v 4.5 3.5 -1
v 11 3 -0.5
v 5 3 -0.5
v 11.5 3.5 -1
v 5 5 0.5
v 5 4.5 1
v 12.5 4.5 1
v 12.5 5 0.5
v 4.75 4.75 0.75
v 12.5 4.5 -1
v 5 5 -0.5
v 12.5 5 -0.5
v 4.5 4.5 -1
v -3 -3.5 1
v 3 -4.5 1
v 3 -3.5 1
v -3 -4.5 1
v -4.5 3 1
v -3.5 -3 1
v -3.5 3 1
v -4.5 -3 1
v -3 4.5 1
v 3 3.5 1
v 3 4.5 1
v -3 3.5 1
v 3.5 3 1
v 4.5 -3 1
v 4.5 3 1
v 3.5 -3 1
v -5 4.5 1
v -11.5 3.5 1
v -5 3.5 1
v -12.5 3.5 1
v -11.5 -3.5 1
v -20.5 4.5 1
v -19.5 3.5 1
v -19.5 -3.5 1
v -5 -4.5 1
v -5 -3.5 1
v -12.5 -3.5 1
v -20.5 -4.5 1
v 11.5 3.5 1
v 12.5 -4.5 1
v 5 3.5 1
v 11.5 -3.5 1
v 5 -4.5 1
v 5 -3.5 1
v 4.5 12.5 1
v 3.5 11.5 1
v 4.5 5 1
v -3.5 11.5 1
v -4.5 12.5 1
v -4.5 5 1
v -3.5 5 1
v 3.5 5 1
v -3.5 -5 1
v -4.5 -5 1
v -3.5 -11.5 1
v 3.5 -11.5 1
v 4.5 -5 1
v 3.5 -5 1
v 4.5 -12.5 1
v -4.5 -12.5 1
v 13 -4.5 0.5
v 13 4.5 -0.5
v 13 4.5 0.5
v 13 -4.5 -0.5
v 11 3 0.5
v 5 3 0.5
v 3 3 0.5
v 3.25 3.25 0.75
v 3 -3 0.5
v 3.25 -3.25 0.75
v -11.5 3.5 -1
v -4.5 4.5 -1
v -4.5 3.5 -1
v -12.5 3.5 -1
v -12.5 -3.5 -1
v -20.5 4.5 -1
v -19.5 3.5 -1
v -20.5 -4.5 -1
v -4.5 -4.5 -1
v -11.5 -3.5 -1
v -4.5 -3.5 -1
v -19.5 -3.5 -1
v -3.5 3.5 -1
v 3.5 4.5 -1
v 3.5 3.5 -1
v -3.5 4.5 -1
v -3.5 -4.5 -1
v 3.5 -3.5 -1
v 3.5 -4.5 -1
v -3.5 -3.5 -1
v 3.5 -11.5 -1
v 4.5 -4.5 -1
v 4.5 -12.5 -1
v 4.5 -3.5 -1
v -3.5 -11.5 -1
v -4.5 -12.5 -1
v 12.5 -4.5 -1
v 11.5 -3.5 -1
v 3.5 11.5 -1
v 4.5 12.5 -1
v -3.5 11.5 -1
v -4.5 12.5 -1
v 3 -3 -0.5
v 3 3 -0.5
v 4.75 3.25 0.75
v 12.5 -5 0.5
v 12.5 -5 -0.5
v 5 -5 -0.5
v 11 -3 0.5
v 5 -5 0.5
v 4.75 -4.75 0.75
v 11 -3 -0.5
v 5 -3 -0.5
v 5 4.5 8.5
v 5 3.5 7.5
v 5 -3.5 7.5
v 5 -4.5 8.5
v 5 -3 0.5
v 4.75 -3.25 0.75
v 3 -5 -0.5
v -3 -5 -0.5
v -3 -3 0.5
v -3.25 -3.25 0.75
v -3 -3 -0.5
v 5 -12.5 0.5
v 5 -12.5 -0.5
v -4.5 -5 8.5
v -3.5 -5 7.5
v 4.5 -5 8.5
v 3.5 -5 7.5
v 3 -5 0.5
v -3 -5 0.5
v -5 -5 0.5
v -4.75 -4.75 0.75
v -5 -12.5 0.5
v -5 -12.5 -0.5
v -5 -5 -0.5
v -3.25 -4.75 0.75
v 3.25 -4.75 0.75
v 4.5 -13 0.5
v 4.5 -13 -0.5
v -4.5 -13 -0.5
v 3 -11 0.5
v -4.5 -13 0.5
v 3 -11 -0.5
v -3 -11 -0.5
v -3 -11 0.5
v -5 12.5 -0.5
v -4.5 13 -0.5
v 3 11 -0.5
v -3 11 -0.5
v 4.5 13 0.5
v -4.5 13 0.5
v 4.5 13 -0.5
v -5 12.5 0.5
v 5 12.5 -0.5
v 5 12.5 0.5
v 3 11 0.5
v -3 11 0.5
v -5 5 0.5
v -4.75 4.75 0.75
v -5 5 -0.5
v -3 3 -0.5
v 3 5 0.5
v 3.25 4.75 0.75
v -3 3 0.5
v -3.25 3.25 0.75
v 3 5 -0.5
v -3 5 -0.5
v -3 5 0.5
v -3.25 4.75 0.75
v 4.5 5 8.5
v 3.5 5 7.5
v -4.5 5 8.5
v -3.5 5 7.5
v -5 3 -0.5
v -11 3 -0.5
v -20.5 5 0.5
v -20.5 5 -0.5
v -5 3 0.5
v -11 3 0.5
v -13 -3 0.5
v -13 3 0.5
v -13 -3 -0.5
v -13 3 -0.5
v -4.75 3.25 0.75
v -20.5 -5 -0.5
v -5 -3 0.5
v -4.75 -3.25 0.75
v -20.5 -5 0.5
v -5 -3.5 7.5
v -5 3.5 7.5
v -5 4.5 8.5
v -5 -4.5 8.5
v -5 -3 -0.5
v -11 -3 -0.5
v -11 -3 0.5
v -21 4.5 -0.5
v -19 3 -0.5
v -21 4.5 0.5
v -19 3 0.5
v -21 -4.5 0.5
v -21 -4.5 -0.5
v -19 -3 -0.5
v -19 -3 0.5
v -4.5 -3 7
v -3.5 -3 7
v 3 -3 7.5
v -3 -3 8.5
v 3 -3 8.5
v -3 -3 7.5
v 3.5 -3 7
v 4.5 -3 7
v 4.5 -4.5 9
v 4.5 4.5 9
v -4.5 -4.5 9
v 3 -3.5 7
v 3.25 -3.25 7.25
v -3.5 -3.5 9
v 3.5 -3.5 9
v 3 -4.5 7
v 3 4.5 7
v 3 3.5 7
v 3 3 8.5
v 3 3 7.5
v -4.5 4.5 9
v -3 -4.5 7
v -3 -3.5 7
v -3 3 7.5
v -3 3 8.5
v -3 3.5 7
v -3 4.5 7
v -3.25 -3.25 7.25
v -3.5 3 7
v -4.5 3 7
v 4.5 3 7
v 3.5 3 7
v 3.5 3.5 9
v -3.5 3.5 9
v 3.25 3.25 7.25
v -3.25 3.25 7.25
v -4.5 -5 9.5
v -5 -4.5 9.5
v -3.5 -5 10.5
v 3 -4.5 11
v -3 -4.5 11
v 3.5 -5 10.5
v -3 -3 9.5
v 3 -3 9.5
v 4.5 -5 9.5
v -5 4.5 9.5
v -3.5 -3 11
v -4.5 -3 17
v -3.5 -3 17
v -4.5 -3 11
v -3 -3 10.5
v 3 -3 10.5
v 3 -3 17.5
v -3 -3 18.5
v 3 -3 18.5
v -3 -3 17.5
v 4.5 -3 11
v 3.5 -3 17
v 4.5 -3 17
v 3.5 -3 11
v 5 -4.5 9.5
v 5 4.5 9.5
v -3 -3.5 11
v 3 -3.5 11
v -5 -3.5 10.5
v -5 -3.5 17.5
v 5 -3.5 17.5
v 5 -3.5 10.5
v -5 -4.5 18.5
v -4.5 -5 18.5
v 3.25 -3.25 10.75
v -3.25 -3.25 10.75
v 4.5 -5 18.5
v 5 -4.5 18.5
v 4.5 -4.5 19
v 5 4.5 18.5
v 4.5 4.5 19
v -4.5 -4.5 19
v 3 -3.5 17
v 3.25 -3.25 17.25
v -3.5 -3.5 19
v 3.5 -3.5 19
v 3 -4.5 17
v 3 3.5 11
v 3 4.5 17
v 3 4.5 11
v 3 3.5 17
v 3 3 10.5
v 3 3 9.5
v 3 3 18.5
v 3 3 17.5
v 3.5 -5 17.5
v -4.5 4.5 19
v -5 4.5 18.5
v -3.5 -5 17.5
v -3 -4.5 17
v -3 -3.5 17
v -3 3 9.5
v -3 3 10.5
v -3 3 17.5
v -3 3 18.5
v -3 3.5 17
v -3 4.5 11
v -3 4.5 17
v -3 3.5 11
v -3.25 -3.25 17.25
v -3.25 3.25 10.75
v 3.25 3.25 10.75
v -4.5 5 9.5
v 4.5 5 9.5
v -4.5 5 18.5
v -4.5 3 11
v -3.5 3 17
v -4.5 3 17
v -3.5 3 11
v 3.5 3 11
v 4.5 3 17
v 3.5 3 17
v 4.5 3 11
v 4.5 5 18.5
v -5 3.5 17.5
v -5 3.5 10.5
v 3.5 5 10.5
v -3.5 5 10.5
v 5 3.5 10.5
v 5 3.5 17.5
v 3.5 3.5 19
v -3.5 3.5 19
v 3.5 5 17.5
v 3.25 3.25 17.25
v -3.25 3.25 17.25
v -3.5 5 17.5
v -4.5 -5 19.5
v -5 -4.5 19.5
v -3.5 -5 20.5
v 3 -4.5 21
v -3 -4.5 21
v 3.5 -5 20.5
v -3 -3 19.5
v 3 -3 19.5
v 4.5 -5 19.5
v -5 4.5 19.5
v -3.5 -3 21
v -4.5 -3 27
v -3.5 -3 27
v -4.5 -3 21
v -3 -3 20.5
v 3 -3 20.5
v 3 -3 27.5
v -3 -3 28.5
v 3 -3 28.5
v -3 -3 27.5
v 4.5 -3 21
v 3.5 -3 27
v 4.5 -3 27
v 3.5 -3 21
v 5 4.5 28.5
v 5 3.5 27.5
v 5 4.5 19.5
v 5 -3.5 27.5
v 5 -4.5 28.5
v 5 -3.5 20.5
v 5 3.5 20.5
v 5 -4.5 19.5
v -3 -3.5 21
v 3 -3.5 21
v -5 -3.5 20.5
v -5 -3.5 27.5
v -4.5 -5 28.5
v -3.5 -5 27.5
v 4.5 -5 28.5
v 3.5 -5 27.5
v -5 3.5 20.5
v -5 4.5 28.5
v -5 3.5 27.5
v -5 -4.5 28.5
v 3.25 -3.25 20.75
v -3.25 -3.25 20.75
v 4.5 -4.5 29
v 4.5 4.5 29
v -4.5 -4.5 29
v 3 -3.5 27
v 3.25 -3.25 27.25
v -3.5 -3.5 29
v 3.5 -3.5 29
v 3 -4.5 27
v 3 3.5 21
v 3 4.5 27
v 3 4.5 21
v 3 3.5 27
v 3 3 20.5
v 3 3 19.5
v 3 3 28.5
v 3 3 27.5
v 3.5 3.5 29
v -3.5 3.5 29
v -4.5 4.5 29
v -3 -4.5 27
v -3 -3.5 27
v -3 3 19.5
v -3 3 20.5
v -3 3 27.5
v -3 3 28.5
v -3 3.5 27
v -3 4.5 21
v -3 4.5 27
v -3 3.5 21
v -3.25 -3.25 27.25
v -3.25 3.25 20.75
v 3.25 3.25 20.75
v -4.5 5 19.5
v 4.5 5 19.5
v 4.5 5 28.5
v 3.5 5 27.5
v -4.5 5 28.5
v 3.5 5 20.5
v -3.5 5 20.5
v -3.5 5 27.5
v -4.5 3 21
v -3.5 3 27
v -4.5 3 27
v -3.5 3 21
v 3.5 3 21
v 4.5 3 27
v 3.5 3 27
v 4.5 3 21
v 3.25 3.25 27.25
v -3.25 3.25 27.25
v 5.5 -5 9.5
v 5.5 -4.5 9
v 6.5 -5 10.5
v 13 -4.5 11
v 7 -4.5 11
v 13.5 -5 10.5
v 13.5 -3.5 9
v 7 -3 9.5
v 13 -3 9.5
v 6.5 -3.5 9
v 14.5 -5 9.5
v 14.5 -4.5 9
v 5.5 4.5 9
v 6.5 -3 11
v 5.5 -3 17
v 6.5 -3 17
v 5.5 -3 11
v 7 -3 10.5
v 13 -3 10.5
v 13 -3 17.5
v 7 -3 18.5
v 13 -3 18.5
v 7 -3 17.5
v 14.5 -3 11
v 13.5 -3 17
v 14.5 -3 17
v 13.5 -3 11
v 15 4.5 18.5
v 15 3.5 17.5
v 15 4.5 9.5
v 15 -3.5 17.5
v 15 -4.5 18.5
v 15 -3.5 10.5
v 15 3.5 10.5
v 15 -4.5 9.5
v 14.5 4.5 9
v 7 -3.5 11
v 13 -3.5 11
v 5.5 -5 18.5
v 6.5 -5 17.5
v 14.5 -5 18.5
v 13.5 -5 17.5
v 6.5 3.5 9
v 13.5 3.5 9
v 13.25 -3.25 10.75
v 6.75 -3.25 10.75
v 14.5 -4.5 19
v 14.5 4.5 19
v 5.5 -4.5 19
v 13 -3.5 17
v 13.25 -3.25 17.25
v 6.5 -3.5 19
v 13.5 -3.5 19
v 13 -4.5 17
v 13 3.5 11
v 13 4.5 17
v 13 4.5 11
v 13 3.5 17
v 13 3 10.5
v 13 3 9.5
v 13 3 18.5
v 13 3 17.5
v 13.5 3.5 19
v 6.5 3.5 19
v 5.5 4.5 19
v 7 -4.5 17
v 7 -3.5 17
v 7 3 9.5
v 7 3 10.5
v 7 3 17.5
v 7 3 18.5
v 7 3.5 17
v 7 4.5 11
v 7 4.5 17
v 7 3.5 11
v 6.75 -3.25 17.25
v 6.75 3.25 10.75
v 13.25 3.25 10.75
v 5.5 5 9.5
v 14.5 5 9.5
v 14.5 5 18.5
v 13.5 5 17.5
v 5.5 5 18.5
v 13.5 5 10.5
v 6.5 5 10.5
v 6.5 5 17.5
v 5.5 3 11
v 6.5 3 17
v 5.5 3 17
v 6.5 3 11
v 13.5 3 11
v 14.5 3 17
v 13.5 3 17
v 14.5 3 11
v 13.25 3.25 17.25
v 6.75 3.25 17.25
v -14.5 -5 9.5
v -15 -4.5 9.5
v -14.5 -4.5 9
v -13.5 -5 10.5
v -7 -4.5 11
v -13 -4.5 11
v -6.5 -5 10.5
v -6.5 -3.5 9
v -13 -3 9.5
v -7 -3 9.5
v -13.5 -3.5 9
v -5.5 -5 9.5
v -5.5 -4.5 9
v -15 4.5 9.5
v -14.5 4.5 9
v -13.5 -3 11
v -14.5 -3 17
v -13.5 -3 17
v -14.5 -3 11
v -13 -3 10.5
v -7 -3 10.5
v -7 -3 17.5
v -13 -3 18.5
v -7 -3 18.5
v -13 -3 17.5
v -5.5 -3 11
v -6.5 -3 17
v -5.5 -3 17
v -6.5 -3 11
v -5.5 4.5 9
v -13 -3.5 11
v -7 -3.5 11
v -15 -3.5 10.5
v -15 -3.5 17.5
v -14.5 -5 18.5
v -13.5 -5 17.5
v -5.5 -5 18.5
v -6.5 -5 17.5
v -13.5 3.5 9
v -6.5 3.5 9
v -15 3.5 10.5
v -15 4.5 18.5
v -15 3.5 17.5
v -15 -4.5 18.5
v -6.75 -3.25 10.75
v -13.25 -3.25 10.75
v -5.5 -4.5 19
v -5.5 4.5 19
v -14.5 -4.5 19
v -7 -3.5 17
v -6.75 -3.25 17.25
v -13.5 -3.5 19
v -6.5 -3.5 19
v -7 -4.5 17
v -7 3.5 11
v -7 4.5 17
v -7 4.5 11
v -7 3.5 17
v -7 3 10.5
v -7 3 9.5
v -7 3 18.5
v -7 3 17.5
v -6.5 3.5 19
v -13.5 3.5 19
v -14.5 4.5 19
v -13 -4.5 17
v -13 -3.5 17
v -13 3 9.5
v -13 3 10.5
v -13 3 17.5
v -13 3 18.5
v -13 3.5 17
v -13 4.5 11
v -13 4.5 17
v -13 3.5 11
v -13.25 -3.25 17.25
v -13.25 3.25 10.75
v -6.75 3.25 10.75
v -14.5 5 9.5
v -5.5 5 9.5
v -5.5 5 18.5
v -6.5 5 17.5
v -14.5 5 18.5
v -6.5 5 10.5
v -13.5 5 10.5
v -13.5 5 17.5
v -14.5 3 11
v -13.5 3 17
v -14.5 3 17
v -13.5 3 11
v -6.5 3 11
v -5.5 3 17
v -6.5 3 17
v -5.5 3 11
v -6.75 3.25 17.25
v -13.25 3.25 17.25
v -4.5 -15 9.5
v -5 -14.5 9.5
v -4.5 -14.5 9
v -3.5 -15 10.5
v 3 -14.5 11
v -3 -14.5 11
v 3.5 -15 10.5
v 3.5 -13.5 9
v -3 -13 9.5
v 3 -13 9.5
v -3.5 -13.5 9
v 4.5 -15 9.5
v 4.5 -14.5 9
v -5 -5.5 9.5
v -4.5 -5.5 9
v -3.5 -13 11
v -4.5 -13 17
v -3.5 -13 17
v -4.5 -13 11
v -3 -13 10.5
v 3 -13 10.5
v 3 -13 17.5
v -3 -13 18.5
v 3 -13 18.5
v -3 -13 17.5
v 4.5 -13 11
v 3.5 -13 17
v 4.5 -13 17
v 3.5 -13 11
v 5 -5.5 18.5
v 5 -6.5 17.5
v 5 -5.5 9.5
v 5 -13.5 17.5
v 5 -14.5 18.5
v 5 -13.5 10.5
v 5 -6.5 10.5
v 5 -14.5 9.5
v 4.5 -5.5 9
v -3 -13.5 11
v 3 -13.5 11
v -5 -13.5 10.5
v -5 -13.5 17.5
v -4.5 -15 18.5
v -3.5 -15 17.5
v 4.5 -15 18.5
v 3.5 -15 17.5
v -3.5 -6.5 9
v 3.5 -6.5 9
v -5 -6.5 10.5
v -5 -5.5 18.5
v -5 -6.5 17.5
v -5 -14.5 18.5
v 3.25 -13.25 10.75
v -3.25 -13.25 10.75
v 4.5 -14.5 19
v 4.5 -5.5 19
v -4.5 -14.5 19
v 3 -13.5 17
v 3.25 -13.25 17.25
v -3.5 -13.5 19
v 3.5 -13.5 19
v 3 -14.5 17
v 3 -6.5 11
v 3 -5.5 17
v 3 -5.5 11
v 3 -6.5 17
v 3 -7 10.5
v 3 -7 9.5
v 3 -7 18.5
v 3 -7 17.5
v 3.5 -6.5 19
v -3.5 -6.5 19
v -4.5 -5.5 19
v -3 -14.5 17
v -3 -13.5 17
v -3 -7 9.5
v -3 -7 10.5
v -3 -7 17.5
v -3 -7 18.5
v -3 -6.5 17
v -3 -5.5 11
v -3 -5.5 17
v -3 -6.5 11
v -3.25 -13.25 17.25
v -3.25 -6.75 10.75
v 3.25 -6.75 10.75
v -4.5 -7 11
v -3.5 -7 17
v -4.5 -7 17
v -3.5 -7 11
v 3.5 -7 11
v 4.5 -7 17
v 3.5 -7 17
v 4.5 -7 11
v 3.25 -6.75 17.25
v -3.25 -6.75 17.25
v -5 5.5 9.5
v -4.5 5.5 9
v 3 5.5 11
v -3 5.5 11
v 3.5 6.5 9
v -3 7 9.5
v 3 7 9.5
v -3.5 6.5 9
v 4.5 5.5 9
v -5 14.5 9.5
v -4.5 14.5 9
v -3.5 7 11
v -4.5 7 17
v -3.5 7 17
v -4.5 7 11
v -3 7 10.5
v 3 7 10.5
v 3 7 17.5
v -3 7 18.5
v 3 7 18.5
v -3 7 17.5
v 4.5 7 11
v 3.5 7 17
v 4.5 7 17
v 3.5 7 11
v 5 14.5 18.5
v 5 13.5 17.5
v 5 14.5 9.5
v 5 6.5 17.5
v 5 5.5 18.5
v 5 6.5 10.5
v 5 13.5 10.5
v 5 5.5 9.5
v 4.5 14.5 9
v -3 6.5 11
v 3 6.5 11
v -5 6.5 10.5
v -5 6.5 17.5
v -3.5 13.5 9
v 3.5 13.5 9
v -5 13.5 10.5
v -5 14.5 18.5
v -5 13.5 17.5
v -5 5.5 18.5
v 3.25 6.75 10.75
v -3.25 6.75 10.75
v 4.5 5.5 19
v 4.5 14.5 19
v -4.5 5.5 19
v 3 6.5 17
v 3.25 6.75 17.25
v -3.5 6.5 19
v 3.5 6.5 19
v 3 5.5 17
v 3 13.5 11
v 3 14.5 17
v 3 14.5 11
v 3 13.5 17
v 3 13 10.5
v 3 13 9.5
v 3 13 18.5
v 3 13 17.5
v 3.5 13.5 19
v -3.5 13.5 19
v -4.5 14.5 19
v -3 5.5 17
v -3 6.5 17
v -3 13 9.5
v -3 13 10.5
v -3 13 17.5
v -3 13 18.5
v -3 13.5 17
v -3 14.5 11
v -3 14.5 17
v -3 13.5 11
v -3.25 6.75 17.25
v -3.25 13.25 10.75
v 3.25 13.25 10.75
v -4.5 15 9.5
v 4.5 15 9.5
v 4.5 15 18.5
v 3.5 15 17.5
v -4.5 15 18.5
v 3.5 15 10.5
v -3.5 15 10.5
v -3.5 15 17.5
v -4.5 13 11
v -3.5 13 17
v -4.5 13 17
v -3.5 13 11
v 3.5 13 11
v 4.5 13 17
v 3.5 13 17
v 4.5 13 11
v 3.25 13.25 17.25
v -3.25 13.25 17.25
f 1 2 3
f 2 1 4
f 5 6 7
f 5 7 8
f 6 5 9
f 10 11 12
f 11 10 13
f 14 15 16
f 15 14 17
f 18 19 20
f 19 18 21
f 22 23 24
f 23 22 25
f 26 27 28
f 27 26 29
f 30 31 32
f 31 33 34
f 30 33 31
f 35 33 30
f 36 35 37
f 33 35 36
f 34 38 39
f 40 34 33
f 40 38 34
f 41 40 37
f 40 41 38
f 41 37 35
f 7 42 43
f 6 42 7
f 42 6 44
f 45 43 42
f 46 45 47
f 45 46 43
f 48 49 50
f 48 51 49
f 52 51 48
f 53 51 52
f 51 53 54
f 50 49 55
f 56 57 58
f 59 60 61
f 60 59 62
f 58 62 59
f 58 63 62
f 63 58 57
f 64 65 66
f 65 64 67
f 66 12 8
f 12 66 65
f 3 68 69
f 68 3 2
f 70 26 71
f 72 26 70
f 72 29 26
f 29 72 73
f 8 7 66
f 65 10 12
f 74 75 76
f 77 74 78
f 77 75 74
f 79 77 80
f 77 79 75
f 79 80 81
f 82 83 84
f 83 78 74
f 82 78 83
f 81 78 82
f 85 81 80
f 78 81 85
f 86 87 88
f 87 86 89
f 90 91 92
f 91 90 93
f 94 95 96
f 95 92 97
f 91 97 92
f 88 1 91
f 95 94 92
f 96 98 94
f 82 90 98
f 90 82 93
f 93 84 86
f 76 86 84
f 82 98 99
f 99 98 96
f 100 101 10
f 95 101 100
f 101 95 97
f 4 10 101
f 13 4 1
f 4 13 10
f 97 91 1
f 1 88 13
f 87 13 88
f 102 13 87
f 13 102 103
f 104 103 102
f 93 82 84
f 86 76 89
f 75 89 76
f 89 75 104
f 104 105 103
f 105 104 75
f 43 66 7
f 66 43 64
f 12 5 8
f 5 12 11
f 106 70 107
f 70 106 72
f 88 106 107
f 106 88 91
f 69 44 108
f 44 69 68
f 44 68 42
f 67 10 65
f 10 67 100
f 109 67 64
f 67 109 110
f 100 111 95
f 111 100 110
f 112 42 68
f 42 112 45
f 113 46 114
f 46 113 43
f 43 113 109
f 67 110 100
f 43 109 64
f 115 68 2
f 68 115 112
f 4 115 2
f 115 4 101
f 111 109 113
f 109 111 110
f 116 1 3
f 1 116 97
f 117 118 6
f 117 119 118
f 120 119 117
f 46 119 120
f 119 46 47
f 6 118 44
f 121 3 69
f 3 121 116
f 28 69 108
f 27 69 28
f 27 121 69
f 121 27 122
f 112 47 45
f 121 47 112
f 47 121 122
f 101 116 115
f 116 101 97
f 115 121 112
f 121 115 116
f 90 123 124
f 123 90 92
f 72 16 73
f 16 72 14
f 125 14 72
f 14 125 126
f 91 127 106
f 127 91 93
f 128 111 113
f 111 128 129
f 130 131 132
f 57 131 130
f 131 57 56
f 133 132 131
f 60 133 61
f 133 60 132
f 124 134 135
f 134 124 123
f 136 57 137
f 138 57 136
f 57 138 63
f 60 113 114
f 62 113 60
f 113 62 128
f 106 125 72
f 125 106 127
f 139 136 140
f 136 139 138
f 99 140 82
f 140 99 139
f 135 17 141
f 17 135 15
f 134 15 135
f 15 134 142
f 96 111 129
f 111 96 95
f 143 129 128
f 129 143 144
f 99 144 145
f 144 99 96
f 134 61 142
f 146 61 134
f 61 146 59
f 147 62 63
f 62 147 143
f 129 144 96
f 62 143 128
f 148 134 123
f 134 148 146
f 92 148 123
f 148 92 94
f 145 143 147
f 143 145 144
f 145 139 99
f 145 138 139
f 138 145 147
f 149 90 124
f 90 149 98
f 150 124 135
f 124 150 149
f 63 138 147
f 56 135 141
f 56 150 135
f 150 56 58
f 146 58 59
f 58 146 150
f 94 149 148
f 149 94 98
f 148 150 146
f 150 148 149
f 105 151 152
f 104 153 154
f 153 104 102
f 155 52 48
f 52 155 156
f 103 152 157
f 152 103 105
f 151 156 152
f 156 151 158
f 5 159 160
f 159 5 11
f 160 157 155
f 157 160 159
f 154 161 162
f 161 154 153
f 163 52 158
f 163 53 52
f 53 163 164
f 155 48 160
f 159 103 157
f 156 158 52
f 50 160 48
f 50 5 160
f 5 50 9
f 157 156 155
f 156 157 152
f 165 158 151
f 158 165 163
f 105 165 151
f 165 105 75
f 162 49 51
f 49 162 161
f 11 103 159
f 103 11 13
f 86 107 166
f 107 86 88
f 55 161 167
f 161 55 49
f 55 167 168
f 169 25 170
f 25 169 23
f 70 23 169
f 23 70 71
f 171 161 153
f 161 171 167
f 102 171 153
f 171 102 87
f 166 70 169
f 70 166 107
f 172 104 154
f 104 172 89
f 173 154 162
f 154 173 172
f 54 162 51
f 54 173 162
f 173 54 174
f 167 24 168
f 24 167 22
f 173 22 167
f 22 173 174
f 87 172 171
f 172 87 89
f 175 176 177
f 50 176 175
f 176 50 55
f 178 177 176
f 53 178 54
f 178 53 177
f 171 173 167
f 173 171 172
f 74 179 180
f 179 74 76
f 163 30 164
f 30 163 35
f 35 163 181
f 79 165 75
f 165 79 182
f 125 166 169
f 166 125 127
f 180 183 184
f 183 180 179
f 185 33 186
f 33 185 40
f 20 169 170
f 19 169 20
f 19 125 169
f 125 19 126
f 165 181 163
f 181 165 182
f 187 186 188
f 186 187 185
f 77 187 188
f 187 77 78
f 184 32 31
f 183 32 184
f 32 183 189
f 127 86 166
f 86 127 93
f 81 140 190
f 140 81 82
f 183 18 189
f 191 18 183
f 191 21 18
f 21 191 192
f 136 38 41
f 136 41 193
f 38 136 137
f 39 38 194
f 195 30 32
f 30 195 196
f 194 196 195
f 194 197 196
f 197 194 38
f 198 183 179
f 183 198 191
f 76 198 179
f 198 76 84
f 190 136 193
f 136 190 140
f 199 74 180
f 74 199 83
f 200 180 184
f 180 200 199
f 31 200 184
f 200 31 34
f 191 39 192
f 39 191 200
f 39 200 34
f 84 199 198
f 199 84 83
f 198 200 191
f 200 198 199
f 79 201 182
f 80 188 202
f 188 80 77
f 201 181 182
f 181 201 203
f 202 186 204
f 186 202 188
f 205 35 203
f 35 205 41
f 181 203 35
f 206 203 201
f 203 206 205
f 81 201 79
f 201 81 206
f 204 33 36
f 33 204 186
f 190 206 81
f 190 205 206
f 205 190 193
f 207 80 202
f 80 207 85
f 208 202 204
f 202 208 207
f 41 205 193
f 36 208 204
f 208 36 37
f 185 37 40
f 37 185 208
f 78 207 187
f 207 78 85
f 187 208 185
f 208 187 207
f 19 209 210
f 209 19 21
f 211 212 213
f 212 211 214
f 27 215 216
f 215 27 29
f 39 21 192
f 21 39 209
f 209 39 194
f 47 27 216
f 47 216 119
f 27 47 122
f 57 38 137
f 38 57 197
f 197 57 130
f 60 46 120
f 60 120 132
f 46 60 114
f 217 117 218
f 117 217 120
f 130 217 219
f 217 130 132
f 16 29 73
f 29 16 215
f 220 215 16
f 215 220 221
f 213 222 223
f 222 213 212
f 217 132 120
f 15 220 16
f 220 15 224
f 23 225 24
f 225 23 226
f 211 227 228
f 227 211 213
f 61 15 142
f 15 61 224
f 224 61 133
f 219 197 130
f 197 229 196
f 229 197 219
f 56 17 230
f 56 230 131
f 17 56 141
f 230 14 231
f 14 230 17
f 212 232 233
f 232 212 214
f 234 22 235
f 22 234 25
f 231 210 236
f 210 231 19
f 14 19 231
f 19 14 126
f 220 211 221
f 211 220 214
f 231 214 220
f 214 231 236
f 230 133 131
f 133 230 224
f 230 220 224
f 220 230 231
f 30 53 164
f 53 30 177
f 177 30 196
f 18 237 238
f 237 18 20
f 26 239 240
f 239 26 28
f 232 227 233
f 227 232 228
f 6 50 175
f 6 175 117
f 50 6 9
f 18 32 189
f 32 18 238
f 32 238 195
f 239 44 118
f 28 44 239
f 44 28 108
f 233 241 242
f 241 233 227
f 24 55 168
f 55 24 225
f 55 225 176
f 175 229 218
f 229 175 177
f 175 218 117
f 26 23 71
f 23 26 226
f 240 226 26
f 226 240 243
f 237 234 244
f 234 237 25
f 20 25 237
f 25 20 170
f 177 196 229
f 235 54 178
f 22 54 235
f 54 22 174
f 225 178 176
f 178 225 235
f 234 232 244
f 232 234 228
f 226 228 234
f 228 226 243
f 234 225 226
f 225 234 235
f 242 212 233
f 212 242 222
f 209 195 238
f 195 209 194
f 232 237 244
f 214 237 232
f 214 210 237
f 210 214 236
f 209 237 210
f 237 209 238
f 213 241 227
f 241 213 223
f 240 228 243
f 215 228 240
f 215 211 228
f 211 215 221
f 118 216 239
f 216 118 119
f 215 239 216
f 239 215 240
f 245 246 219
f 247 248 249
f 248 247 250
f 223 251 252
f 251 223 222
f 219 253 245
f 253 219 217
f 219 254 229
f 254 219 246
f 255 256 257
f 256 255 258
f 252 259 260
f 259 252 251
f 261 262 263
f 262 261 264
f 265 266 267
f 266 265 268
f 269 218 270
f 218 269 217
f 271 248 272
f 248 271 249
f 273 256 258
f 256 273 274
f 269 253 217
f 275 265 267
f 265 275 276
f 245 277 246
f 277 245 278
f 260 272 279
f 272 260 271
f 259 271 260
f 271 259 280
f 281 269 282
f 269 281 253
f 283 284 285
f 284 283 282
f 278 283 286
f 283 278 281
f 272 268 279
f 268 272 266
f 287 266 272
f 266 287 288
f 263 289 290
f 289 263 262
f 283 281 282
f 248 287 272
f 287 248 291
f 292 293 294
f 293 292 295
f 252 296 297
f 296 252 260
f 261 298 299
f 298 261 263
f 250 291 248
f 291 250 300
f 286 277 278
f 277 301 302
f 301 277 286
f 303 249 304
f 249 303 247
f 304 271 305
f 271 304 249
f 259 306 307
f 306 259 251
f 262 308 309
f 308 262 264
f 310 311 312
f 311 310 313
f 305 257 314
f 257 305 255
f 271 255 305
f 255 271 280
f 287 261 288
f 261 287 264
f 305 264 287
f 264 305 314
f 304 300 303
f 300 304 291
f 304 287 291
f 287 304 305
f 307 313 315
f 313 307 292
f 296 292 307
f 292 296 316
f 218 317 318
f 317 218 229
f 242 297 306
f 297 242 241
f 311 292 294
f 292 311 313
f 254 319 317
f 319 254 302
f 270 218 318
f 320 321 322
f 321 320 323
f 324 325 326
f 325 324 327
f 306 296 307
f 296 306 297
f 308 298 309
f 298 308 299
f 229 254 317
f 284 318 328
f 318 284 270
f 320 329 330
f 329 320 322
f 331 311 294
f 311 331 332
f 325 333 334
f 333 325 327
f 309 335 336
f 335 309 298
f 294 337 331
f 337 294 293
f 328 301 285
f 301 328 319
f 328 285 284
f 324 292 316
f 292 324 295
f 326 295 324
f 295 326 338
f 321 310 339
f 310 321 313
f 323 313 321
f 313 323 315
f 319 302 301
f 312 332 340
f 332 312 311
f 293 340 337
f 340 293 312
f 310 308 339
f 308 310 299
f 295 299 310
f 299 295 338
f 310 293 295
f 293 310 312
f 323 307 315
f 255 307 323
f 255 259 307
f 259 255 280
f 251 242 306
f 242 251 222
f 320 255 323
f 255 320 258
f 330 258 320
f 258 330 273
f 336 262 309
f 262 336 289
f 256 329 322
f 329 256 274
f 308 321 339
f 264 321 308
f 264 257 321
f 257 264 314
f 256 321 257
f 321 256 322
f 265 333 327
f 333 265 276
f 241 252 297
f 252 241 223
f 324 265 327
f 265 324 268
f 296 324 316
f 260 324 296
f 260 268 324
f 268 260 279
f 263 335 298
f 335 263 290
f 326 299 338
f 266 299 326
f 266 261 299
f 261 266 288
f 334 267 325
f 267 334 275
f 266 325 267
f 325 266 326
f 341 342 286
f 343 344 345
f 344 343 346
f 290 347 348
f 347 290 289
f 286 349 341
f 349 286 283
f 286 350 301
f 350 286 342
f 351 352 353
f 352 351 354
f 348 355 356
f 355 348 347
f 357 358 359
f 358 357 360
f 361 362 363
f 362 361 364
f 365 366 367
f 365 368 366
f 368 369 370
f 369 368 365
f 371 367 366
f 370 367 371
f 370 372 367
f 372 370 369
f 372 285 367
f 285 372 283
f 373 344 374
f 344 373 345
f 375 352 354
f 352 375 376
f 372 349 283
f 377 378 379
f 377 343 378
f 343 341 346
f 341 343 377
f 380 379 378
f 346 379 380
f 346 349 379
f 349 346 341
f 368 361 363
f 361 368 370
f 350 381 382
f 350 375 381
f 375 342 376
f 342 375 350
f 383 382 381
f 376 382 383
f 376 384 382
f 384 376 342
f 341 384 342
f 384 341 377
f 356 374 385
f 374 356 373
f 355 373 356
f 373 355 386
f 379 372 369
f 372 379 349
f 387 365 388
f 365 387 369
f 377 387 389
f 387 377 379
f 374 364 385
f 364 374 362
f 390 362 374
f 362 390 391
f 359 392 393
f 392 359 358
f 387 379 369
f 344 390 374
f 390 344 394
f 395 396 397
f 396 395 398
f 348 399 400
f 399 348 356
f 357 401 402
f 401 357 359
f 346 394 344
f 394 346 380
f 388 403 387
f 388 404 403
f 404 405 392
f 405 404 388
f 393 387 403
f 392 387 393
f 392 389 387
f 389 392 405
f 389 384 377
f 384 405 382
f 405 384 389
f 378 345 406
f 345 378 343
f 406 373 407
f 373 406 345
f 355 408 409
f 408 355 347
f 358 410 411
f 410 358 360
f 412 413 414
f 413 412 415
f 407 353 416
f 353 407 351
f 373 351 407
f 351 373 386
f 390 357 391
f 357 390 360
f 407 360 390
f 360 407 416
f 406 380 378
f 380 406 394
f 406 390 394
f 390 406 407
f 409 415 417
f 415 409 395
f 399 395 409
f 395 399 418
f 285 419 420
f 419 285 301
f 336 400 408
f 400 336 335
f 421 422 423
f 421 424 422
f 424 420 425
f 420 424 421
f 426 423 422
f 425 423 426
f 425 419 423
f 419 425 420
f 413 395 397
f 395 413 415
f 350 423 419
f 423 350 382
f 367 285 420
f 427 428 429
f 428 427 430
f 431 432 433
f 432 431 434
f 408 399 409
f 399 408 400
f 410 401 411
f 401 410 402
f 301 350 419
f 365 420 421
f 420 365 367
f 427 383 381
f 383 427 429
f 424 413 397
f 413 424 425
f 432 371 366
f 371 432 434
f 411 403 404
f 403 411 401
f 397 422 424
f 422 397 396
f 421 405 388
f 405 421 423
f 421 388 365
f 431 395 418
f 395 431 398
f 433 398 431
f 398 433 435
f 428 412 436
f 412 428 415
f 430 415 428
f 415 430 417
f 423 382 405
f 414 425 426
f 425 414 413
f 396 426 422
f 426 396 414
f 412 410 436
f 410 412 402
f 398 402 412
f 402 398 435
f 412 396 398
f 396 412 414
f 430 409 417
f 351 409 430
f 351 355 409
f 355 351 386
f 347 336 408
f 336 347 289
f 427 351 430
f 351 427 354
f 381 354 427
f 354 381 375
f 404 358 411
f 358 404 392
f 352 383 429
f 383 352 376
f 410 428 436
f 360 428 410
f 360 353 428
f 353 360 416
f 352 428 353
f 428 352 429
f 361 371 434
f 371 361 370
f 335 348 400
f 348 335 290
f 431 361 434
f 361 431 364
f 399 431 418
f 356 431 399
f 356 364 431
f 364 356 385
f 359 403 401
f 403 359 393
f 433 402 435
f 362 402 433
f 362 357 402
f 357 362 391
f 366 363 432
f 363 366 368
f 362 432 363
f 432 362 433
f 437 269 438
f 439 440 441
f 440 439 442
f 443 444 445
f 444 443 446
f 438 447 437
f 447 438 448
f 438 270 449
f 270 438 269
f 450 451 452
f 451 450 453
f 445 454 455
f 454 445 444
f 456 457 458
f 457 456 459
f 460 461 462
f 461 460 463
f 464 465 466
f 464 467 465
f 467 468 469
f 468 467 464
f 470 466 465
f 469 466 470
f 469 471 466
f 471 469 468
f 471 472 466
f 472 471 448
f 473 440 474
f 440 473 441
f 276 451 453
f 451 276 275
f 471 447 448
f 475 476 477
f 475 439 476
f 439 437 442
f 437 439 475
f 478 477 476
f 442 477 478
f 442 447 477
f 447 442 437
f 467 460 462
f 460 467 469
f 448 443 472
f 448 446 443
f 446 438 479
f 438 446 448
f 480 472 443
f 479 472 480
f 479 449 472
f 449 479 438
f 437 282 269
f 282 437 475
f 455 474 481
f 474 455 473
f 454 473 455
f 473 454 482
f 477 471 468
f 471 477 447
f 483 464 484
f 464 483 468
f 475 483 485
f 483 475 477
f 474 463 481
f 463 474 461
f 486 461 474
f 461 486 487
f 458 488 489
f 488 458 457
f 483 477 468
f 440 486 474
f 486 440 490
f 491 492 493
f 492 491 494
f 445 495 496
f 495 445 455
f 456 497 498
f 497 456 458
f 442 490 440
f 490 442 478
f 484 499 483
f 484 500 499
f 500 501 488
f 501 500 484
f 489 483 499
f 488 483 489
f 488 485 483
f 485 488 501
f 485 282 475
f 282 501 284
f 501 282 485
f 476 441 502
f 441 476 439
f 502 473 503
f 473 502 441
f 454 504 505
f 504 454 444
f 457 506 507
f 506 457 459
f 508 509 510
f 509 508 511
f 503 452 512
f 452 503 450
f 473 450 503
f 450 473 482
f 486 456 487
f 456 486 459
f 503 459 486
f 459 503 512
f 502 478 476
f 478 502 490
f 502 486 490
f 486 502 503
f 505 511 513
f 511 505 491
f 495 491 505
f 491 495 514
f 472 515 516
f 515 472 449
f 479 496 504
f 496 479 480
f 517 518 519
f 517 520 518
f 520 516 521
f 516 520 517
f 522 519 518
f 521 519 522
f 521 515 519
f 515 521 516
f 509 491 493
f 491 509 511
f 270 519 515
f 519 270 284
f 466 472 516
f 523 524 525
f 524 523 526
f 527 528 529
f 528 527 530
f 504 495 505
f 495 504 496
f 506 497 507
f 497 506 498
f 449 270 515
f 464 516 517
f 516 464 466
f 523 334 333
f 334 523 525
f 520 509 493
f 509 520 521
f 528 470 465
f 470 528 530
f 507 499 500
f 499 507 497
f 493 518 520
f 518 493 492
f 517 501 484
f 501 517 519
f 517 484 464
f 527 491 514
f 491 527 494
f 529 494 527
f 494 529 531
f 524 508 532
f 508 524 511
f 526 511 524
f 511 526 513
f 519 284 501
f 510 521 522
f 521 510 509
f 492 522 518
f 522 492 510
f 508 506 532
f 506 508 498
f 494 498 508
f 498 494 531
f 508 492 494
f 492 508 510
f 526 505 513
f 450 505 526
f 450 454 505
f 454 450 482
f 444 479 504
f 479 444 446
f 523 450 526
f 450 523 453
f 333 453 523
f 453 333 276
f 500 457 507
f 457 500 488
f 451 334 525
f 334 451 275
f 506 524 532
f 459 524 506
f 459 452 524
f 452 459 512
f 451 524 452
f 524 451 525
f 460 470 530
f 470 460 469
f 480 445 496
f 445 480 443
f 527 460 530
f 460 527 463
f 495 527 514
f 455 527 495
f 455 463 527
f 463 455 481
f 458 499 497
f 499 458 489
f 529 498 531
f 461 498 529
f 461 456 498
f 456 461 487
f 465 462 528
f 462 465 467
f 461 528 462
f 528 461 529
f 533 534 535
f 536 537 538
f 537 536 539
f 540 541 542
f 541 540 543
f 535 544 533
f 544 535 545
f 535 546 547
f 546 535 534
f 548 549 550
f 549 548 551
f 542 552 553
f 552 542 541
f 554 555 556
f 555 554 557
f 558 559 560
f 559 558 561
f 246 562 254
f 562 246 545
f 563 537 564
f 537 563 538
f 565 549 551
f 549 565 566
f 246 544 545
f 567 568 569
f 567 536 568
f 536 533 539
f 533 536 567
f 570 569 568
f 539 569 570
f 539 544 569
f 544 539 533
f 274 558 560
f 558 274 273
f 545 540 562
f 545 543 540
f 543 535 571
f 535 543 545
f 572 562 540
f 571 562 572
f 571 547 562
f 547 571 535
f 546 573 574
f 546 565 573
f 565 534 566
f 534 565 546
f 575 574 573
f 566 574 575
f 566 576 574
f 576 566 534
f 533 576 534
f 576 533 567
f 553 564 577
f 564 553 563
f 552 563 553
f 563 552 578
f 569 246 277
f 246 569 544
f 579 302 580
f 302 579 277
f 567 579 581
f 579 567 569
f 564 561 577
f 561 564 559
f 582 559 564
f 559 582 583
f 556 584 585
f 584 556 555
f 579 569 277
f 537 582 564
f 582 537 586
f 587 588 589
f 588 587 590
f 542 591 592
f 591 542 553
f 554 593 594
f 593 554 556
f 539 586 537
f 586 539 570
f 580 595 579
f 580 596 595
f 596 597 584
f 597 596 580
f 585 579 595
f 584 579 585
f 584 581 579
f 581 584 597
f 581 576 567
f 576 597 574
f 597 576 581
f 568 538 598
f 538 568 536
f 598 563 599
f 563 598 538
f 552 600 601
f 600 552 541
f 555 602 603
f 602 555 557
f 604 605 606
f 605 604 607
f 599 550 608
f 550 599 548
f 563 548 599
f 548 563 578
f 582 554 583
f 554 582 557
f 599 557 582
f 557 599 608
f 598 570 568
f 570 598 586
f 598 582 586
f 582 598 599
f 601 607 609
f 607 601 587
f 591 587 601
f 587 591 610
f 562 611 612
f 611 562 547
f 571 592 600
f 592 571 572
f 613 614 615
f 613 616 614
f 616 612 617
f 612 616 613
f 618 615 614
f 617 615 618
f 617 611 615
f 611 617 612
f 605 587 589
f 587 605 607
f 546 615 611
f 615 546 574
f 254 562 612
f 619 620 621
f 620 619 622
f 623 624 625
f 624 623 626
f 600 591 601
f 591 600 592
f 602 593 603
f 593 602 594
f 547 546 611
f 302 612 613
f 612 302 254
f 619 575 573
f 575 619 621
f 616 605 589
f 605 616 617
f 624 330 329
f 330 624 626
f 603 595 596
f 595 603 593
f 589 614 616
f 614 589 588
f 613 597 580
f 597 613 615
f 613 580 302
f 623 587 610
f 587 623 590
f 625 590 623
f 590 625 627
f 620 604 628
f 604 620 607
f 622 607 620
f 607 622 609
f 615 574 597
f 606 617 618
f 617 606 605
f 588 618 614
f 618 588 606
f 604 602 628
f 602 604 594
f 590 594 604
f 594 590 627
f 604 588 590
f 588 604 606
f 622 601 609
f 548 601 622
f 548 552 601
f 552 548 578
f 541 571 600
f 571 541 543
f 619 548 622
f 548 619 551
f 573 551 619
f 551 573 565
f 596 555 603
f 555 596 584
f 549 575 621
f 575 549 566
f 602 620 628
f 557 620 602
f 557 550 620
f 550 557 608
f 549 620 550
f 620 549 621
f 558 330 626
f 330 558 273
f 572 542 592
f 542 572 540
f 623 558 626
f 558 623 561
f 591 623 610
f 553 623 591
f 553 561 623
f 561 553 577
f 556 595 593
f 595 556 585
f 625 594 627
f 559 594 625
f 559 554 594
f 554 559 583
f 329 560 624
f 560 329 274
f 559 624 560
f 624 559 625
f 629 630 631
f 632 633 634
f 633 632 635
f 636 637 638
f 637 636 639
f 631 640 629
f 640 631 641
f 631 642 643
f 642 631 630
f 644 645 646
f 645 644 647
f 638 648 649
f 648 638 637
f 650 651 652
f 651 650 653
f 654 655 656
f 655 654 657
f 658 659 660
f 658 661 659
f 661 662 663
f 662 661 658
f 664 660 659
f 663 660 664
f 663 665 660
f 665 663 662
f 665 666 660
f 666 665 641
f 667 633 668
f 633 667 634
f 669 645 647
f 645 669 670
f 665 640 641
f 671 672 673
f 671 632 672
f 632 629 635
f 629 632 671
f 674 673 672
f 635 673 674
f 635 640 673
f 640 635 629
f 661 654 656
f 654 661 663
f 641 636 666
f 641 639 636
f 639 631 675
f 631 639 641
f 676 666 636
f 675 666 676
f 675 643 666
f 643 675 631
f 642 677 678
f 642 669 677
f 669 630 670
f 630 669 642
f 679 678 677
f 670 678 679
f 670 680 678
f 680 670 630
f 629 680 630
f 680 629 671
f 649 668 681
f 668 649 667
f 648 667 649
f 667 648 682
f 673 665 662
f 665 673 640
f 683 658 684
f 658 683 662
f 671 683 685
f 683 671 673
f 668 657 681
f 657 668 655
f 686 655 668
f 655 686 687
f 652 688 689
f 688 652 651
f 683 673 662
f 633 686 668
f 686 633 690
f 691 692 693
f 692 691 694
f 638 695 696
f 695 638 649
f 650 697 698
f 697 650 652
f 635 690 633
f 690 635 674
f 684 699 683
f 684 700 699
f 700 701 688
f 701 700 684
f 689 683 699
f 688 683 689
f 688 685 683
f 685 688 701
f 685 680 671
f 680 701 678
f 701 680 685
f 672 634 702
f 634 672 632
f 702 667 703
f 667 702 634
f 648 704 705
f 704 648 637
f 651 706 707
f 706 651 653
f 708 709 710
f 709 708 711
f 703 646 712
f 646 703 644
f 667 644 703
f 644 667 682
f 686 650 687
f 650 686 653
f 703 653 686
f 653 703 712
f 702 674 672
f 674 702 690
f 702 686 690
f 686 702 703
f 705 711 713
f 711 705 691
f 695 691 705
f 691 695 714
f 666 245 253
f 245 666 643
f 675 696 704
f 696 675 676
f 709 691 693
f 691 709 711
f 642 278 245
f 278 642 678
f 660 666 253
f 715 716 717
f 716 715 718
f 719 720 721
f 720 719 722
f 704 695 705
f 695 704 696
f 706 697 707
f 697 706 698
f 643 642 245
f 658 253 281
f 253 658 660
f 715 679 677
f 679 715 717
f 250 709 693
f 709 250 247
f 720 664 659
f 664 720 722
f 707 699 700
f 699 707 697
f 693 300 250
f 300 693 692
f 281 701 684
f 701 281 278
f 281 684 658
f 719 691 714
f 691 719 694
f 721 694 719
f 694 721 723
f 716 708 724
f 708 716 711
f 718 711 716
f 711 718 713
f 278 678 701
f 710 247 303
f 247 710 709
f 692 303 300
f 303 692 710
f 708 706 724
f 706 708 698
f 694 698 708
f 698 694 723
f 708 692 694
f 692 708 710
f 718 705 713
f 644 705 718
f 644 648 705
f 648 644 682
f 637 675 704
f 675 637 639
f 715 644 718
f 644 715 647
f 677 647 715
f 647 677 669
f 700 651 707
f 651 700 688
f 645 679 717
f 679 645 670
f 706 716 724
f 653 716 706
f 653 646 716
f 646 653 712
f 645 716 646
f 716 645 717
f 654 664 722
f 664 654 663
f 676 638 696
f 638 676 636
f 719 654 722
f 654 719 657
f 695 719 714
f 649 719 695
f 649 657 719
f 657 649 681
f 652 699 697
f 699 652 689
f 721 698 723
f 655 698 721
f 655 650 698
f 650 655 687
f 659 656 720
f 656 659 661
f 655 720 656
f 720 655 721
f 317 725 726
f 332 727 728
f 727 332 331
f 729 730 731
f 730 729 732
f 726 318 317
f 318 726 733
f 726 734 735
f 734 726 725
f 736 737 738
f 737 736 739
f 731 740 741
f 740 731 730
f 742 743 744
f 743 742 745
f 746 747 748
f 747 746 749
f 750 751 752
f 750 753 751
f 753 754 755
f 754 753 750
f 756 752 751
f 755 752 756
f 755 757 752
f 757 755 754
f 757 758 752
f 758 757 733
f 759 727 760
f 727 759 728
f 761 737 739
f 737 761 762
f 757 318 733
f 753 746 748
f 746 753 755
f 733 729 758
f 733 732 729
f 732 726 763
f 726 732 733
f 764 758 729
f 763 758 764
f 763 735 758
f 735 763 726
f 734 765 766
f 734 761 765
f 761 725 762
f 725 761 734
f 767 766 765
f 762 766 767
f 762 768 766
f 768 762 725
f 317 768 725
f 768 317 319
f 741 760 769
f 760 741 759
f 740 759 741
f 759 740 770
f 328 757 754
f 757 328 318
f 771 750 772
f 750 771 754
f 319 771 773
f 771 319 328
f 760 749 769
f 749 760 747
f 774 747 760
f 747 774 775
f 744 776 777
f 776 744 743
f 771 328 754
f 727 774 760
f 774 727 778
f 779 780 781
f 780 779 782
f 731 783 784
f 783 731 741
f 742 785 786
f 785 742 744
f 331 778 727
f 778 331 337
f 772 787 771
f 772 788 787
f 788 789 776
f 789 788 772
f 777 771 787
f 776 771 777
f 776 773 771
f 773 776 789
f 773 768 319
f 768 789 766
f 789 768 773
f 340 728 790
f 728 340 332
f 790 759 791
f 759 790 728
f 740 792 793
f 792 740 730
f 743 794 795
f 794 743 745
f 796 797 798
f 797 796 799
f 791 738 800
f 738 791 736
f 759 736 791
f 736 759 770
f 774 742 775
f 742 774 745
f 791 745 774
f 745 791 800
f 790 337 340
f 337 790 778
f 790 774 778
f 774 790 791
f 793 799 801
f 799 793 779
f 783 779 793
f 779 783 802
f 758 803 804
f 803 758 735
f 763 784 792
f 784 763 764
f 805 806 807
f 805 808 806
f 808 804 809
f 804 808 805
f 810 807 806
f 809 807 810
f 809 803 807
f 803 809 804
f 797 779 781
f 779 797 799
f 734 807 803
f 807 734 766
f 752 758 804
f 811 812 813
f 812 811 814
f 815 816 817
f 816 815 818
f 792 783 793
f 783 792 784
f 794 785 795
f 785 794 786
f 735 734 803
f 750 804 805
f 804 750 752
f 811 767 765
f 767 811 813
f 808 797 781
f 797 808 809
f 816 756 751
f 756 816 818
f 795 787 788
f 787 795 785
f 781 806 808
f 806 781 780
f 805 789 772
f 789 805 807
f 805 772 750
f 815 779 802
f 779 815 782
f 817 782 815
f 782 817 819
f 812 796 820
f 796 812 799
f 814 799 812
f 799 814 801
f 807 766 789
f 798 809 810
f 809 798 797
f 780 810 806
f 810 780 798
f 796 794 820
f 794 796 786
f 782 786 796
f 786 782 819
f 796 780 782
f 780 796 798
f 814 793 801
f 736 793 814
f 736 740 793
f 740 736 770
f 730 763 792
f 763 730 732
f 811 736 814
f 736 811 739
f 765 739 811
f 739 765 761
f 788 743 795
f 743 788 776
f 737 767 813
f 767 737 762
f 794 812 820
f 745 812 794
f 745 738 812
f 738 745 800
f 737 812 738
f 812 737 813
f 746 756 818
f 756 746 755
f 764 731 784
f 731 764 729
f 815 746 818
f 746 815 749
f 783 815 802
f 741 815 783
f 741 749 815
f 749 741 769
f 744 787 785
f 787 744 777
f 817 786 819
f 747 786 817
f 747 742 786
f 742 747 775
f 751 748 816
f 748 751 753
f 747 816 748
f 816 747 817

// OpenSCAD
module edge(){
	w=10;
	hull() {
		cube([w-1,1,2],center=true);
		cube([w-1,2,1],center=true);
		cube([w,1,1],center=true);
	}
}

module face(){
	translate([0,0,-4]) edge();
	translate([4,0,0]) rotate([0,90,0]) edge();
	translate([-4,0,0]) rotate([0,90,0]) edge();
	translate([0,0,4]) edge();
}

module hyperface(w=10){
	translate([0,-4,0]) face();
	translate([0,4,0]) face();
	translate([-4,0,0]) rotate([0,0,90]) face();
	translate([4,0,0]) rotate([0,0,90]) face();
}

color("gray") 
union() {
	translate([8,0,0]) rotate([90,0,0]) face();
	translate([0,-8,0]) rotate([90,0,0]) face();
	translate([0,8,0]) rotate([90,0,0]) face();
	translate([-8,0,0]) rotate([90,0,0]) face();
	translate([-16,0,0]) rotate([90,0,0]) face();
	translate([0,0,4]) hyperface();
	translate([0,0,14]) hyperface();
	translate([0,0,24]) hyperface();
	translate([10,0,14]) hyperface();
	translate([-10,0,14]) hyperface();
	translate([0,-10,14]) hyperface();
	translate([0,10,14]) hyperface();
}
